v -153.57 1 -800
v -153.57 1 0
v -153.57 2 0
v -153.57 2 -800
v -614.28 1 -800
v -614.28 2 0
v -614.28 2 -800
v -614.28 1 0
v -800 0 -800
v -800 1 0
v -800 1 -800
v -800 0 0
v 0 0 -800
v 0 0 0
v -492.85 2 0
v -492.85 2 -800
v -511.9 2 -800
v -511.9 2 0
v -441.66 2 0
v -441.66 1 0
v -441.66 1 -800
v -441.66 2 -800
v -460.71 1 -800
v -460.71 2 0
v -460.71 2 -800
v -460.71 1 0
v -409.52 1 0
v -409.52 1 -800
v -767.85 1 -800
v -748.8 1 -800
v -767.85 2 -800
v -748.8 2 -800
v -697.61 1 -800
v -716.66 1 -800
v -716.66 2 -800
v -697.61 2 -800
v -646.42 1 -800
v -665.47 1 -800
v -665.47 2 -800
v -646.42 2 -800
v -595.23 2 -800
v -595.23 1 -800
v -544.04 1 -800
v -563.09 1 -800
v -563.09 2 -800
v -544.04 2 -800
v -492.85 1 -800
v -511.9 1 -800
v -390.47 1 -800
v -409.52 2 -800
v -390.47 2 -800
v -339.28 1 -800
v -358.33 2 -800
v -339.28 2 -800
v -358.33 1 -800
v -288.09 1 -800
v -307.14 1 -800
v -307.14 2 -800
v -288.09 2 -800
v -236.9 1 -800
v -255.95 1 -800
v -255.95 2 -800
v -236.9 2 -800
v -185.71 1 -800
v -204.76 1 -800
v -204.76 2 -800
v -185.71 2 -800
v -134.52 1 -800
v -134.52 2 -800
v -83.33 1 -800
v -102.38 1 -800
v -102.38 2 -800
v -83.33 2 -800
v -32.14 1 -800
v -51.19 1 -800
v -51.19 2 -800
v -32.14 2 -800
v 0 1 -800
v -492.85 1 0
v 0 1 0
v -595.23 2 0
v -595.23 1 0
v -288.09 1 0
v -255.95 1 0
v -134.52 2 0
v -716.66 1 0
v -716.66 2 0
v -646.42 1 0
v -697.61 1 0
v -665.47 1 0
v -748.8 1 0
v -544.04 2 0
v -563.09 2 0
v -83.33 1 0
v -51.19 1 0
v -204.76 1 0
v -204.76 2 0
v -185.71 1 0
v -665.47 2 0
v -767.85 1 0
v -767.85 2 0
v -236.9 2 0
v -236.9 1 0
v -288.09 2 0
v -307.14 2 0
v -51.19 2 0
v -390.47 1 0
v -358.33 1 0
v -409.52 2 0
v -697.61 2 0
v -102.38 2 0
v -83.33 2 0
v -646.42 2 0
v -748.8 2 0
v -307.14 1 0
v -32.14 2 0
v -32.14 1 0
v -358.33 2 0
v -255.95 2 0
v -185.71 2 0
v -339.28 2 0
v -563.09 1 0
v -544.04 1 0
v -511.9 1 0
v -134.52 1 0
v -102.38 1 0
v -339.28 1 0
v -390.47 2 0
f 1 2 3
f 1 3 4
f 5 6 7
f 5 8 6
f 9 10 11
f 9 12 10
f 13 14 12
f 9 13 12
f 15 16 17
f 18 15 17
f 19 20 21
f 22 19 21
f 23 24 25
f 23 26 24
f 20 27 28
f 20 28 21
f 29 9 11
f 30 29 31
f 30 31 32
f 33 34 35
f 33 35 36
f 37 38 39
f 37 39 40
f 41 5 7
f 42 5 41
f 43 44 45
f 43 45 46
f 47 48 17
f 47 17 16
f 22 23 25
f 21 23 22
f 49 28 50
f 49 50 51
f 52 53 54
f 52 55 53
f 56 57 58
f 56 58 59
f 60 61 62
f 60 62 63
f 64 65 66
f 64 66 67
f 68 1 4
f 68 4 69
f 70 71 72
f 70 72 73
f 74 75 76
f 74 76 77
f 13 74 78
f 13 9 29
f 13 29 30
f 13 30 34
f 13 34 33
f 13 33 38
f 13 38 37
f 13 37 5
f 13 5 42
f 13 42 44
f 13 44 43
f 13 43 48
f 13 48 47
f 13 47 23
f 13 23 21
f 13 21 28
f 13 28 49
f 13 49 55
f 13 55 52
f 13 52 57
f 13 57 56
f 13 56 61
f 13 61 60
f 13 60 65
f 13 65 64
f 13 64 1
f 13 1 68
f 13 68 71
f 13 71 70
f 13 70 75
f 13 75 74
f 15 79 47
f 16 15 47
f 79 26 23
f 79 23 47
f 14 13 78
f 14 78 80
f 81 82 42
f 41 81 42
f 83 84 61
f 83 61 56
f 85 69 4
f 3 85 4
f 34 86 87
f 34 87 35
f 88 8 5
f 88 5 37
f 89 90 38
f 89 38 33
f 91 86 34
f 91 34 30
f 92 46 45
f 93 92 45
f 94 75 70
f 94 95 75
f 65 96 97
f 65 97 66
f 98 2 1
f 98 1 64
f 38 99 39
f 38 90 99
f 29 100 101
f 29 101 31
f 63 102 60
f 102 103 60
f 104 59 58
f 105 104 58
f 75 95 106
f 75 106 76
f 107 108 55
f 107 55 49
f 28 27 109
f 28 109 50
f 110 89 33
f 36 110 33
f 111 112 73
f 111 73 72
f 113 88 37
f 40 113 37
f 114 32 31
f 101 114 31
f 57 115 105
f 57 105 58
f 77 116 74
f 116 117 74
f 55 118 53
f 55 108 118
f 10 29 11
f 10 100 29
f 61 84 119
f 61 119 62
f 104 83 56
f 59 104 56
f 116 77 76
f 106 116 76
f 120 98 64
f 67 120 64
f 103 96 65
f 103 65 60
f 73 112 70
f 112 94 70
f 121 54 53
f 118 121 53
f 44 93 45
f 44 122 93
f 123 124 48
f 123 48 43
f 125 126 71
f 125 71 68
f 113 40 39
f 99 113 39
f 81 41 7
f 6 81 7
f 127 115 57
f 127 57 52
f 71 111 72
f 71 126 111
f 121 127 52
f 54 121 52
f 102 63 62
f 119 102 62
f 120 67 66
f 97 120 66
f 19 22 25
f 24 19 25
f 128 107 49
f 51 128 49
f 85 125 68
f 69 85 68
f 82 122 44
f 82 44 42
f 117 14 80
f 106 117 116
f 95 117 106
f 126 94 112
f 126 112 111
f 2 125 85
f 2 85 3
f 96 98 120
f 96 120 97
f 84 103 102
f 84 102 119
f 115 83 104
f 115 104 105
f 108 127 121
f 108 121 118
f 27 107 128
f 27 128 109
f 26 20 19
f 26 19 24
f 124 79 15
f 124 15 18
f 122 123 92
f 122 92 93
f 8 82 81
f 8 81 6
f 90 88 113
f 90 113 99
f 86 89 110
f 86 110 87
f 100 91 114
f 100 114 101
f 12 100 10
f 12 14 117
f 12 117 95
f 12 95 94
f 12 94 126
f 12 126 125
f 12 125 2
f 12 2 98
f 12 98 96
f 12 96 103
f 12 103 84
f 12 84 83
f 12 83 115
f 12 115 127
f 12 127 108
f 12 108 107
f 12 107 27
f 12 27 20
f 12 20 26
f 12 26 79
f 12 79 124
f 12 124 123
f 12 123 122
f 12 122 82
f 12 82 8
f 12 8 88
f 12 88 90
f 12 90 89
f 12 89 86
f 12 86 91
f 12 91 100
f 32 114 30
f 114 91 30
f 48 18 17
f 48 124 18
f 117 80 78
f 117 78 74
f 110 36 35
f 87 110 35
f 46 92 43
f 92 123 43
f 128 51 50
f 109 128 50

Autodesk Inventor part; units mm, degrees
ref_plane "YZ Plane" through (0, 0, 0) normal (1, 0, 0) x (0, 1, 0)
ref_plane "XZ Plane" through (0, 0, 0) normal (0, 1, 0) x (-1, 0, 0)
ref_plane "XY Plane" through (0, 0, 0) normal (0, 0, 1) x (1, 0, 0)
sketch "Sketch1" plane through (0, 0, 0) normal (0, 1, 0) x (-1, 0, 0)
  line L0 (0, 0) -> (800, 0)
  line L1 (800, 0) -> (800, -800)
  line L2 (800, -800) -> (0, -800)
  line L3 (0, -800) -> (0, 0)
  line L4 (0, 0) -> (32.14, 0)
  line L5 (32.14, 0) -> (32.14, -800)
  line L6 (32.14, -800) -> (0, -800)
  line L7 (0, -800) -> (0, 0)
  line L8 (32.14, 0) -> (51.19, 0)
  line L9 (51.19, 0) -> (51.19, -800)
  line L10 (51.19, -800) -> (32.14, -800)
  line L11 (32.14, -800) -> (32.14, 0)
  line L12 (51.19, 0) -> (83.33, 0)
  line L13 (83.33, 0) -> (83.33, -800)
  line L14 (83.33, -800) -> (51.19, -800)
  line L15 (51.19, -800) -> (51.19, 0)
  line L16 (83.33, 0) -> (102.38, 0)
  line L17 (102.38, 0) -> (102.38, -800)
  line L18 (102.38, -800) -> (83.33, -800)
  line L19 (83.33, -800) -> (83.33, 0)
  line L20 (102.38, 0) -> (134.52, 0)
  line L21 (134.52, 0) -> (134.52, -800)
  line L22 (134.52, -800) -> (102.38, -800)
  line L23 (102.38, -800) -> (102.38, 0)
  line L24 (134.52, 0) -> (153.57, 0)
  line L25 (153.57, 0) -> (153.57, -800)
  line L26 (153.57, -800) -> (134.52, -800)
  line L27 (134.52, -800) -> (134.52, 0)
  line L28 (153.57, 0) -> (185.71, 0)
  line L29 (185.71, 0) -> (185.71, -800)
  line L30 (185.71, -800) -> (153.57, -800)
  line L31 (153.57, -800) -> (153.57, 0)
  line L32 (185.71, 0) -> (204.76, 0)
  line L33 (204.76, 0) -> (204.76, -800)
  line L34 (204.76, -800) -> (185.71, -800)
  line L35 (185.71, -800) -> (185.71, 0)
  line L36 (204.76, 0) -> (236.9, 0)
  line L37 (236.9, 0) -> (236.9, -800)
  line L38 (236.9, -800) -> (204.76, -800)
  line L39 (204.76, -800) -> (204.76, 0)
  line L40 (236.9, 0) -> (255.95, 0)
  line L41 (255.95, 0) -> (255.95, -800)
  line L42 (255.95, -800) -> (236.9, -800)
  line L43 (236.9, -800) -> (236.9, 0)
  line L44 (255.95, 0) -> (288.09, 0)
  line L45 (288.09, 0) -> (288.09, -800)
  line L46 (288.09, -800) -> (255.95, -800)
  line L47 (255.95, -800) -> (255.95, 0)
  line L48 (288.09, 0) -> (307.14, 0)
  line L49 (307.14, 0) -> (307.14, -800)
  line L50 (307.14, -800) -> (288.09, -800)
  line L51 (288.09, -800) -> (288.09, 0)
  line L52 (307.14, 0) -> (339.28, 0)
  line L53 (339.28, 0) -> (339.28, -800)
  line L54 (339.28, -800) -> (307.14, -800)
  line L55 (307.14, -800) -> (307.14, 0)
  line L56 (339.28, 0) -> (358.33, 0)
  line L57 (358.33, 0) -> (358.33, -800)
  line L58 (358.33, -800) -> (339.28, -800)
  line L59 (339.28, -800) -> (339.28, 0)
  line L60 (358.33, 0) -> (390.47, 0)
  line L61 (390.47, 0) -> (390.47, -800)
  line L62 (390.47, -800) -> (358.33, -800)
  line L63 (358.33, -800) -> (358.33, 0)
  line L64 (390.47, 0) -> (409.52, 0)
  line L65 (409.52, 0) -> (409.52, -800)
  line L66 (409.52, -800) -> (390.47, -800)
  line L67 (390.47, -800) -> (390.47, 0)
  line L68 (409.52, 0) -> (441.66, 0)
  line L69 (441.66, 0) -> (441.66, -800)
  line L70 (441.66, -800) -> (409.52, -800)
  line L71 (409.52, -800) -> (409.52, 0)
  line L72 (441.66, 0) -> (460.71, 0)
  line L73 (460.71, 0) -> (460.71, -800)
  line L74 (460.71, -800) -> (441.66, -800)
  line L75 (441.66, -800) -> (441.66, 0)
  line L76 (460.71, 0) -> (492.85, 0)
  line L77 (492.85, 0) -> (492.85, -800)
  line L78 (492.85, -800) -> (460.71, -800)
  line L79 (460.71, -800) -> (460.71, 0)
  line L80 (492.85, 0) -> (511.9, 0)
  line L81 (511.9, 0) -> (511.9, -800)
  line L82 (511.9, -800) -> (492.85, -800)
  line L83 (492.85, -800) -> (492.85, 0)
  line L84 (511.9, 0) -> (544.04, 0)
  line L85 (544.04, 0) -> (544.04, -800)
  line L86 (544.04, -800) -> (511.9, -800)
  line L87 (511.9, -800) -> (511.9, 0)
  line L88 (544.04, 0) -> (563.09, 0)
  line L89 (563.09, 0) -> (563.09, -800)
  line L90 (563.09, -800) -> (544.04, -800)
  line L91 (544.04, -800) -> (544.04, 0)
  line L92 (563.09, 0) -> (595.23, 0)
  line L93 (595.23, 0) -> (595.23, -800)
  line L94 (595.23, -800) -> (563.09, -800)
  line L95 (563.09, -800) -> (563.09, 0)
  line L96 (595.23, 0) -> (614.28, 0)
  line L97 (614.28, 0) -> (614.28, -800)
  line L98 (614.28, -800) -> (595.23, -800)
  line L99 (595.23, -800) -> (595.23, 0)
  line L100 (614.28, 0) -> (646.42, 0)
  line L101 (646.42, 0) -> (646.42, -800)
  line L102 (646.42, -800) -> (614.28, -800)
  line L103 (614.28, -800) -> (614.28, 0)
  line L104 (646.42, 0) -> (665.47, 0)
  line L105 (665.47, 0) -> (665.47, -800)
  line L106 (665.47, -800) -> (646.42, -800)
  line L107 (646.42, -800) -> (646.42, 0)
  line L108 (665.47, 0) -> (697.61, 0)
  line L109 (697.61, 0) -> (697.61, -800)
  line L110 (697.61, -800) -> (665.47, -800)
  line L111 (665.47, -800) -> (665.47, 0)
  line L112 (697.61, 0) -> (716.66, 0)
  line L113 (716.66, 0) -> (716.66, -800)
  line L114 (716.66, -800) -> (697.61, -800)
  line L115 (697.61, -800) -> (697.61, 0)
  line L116 (716.66, 0) -> (748.8, 0)
  line L117 (748.8, 0) -> (748.8, -800)
  line L118 (748.8, -800) -> (716.66, -800)
  line L119 (716.66, -800) -> (716.66, 0)
  line L120 (748.8, 0) -> (767.85, 0)
  line L121 (767.85, 0) -> (767.85, -800)
  line L122 (767.85, -800) -> (748.8, -800)
  line L123 (748.8, -800) -> (748.8, 0)
  dimension "d0" = 800
  dimension "d1" = 800
  dimension "d2" = 32.14
  dimension "d4" = 19.05
  dimension "d6" = 32.14
  dimension "d7" = 19.05
  dimension "d8" = 32.14
  dimension "d9" = 19.05
  dimension "d10" = 32.14
  dimension "d11" = 19.05
  dimension "d12" = 32.14
  dimension "d13" = 19.05
  dimension "d14" = 32.14
  dimension "d15" = 19.05
  dimension "d16" = 32.14
  dimension "d17" = 19.05
  dimension "d18" = 32.14
  dimension "d19" = 19.05
  dimension "d20" = 32.14
  dimension "d21" = 19.05
  dimension "d22" = 32.14
  dimension "d23" = 19.05
  dimension "d24" = 32.14
  dimension "d25" = 19.05
  dimension "d26" = 32.14
  dimension "d27" = 19.05
  dimension "d28" = 32.14
  dimension "d29" = 19.05
  dimension "d30" = 32.14
  dimension "d31" = 19.05
  dimension "d32" = 32.14
  dimension "d33" = 19.05
extrude "Extrusion1" add sketch "Sketch1" along normal blind 1 contours L0 L5 L2 L3 | L0 L13 L2 L9 | L0 L21 L2 L17 | L0 L29 L2 L25 | L0 L37 L2 L33 | L0 L45 L2 L41 | L0 L53 L2 L49 | L0 L61 L2 L57 | L0 L69 L2 L65 | L0 L77 L2 L73 | L0 L85 L2 L81 | L0 L93 L2 L89 | L0 L101 L2 L97 | L0 L109 L2 L105 | L0 L117 L2 L113 | L0 L1 L2 L121
extrude "Extrusion2" add sketch "Sketch1" along normal blind 2 contours L0 L9 L2 L5 | L0 L17 L2 L13 | L0 L25 L2 L21 | L0 L33 L2 L29 | L0 L41 L2 L37 | L0 L49 L2 L45 | L0 L57 L2 L53 | L0 L65 L2 L61 | L0 L73 L2 L69 | L0 L81 L2 L77 | L0 L89 L2 L85 | L0 L97 L2 L93 | L0 L105 L2 L101 | L0 L113 L2 L109 | L0 L121 L2 L117
properties part number "Sensor Grid Rows-Collumns"
